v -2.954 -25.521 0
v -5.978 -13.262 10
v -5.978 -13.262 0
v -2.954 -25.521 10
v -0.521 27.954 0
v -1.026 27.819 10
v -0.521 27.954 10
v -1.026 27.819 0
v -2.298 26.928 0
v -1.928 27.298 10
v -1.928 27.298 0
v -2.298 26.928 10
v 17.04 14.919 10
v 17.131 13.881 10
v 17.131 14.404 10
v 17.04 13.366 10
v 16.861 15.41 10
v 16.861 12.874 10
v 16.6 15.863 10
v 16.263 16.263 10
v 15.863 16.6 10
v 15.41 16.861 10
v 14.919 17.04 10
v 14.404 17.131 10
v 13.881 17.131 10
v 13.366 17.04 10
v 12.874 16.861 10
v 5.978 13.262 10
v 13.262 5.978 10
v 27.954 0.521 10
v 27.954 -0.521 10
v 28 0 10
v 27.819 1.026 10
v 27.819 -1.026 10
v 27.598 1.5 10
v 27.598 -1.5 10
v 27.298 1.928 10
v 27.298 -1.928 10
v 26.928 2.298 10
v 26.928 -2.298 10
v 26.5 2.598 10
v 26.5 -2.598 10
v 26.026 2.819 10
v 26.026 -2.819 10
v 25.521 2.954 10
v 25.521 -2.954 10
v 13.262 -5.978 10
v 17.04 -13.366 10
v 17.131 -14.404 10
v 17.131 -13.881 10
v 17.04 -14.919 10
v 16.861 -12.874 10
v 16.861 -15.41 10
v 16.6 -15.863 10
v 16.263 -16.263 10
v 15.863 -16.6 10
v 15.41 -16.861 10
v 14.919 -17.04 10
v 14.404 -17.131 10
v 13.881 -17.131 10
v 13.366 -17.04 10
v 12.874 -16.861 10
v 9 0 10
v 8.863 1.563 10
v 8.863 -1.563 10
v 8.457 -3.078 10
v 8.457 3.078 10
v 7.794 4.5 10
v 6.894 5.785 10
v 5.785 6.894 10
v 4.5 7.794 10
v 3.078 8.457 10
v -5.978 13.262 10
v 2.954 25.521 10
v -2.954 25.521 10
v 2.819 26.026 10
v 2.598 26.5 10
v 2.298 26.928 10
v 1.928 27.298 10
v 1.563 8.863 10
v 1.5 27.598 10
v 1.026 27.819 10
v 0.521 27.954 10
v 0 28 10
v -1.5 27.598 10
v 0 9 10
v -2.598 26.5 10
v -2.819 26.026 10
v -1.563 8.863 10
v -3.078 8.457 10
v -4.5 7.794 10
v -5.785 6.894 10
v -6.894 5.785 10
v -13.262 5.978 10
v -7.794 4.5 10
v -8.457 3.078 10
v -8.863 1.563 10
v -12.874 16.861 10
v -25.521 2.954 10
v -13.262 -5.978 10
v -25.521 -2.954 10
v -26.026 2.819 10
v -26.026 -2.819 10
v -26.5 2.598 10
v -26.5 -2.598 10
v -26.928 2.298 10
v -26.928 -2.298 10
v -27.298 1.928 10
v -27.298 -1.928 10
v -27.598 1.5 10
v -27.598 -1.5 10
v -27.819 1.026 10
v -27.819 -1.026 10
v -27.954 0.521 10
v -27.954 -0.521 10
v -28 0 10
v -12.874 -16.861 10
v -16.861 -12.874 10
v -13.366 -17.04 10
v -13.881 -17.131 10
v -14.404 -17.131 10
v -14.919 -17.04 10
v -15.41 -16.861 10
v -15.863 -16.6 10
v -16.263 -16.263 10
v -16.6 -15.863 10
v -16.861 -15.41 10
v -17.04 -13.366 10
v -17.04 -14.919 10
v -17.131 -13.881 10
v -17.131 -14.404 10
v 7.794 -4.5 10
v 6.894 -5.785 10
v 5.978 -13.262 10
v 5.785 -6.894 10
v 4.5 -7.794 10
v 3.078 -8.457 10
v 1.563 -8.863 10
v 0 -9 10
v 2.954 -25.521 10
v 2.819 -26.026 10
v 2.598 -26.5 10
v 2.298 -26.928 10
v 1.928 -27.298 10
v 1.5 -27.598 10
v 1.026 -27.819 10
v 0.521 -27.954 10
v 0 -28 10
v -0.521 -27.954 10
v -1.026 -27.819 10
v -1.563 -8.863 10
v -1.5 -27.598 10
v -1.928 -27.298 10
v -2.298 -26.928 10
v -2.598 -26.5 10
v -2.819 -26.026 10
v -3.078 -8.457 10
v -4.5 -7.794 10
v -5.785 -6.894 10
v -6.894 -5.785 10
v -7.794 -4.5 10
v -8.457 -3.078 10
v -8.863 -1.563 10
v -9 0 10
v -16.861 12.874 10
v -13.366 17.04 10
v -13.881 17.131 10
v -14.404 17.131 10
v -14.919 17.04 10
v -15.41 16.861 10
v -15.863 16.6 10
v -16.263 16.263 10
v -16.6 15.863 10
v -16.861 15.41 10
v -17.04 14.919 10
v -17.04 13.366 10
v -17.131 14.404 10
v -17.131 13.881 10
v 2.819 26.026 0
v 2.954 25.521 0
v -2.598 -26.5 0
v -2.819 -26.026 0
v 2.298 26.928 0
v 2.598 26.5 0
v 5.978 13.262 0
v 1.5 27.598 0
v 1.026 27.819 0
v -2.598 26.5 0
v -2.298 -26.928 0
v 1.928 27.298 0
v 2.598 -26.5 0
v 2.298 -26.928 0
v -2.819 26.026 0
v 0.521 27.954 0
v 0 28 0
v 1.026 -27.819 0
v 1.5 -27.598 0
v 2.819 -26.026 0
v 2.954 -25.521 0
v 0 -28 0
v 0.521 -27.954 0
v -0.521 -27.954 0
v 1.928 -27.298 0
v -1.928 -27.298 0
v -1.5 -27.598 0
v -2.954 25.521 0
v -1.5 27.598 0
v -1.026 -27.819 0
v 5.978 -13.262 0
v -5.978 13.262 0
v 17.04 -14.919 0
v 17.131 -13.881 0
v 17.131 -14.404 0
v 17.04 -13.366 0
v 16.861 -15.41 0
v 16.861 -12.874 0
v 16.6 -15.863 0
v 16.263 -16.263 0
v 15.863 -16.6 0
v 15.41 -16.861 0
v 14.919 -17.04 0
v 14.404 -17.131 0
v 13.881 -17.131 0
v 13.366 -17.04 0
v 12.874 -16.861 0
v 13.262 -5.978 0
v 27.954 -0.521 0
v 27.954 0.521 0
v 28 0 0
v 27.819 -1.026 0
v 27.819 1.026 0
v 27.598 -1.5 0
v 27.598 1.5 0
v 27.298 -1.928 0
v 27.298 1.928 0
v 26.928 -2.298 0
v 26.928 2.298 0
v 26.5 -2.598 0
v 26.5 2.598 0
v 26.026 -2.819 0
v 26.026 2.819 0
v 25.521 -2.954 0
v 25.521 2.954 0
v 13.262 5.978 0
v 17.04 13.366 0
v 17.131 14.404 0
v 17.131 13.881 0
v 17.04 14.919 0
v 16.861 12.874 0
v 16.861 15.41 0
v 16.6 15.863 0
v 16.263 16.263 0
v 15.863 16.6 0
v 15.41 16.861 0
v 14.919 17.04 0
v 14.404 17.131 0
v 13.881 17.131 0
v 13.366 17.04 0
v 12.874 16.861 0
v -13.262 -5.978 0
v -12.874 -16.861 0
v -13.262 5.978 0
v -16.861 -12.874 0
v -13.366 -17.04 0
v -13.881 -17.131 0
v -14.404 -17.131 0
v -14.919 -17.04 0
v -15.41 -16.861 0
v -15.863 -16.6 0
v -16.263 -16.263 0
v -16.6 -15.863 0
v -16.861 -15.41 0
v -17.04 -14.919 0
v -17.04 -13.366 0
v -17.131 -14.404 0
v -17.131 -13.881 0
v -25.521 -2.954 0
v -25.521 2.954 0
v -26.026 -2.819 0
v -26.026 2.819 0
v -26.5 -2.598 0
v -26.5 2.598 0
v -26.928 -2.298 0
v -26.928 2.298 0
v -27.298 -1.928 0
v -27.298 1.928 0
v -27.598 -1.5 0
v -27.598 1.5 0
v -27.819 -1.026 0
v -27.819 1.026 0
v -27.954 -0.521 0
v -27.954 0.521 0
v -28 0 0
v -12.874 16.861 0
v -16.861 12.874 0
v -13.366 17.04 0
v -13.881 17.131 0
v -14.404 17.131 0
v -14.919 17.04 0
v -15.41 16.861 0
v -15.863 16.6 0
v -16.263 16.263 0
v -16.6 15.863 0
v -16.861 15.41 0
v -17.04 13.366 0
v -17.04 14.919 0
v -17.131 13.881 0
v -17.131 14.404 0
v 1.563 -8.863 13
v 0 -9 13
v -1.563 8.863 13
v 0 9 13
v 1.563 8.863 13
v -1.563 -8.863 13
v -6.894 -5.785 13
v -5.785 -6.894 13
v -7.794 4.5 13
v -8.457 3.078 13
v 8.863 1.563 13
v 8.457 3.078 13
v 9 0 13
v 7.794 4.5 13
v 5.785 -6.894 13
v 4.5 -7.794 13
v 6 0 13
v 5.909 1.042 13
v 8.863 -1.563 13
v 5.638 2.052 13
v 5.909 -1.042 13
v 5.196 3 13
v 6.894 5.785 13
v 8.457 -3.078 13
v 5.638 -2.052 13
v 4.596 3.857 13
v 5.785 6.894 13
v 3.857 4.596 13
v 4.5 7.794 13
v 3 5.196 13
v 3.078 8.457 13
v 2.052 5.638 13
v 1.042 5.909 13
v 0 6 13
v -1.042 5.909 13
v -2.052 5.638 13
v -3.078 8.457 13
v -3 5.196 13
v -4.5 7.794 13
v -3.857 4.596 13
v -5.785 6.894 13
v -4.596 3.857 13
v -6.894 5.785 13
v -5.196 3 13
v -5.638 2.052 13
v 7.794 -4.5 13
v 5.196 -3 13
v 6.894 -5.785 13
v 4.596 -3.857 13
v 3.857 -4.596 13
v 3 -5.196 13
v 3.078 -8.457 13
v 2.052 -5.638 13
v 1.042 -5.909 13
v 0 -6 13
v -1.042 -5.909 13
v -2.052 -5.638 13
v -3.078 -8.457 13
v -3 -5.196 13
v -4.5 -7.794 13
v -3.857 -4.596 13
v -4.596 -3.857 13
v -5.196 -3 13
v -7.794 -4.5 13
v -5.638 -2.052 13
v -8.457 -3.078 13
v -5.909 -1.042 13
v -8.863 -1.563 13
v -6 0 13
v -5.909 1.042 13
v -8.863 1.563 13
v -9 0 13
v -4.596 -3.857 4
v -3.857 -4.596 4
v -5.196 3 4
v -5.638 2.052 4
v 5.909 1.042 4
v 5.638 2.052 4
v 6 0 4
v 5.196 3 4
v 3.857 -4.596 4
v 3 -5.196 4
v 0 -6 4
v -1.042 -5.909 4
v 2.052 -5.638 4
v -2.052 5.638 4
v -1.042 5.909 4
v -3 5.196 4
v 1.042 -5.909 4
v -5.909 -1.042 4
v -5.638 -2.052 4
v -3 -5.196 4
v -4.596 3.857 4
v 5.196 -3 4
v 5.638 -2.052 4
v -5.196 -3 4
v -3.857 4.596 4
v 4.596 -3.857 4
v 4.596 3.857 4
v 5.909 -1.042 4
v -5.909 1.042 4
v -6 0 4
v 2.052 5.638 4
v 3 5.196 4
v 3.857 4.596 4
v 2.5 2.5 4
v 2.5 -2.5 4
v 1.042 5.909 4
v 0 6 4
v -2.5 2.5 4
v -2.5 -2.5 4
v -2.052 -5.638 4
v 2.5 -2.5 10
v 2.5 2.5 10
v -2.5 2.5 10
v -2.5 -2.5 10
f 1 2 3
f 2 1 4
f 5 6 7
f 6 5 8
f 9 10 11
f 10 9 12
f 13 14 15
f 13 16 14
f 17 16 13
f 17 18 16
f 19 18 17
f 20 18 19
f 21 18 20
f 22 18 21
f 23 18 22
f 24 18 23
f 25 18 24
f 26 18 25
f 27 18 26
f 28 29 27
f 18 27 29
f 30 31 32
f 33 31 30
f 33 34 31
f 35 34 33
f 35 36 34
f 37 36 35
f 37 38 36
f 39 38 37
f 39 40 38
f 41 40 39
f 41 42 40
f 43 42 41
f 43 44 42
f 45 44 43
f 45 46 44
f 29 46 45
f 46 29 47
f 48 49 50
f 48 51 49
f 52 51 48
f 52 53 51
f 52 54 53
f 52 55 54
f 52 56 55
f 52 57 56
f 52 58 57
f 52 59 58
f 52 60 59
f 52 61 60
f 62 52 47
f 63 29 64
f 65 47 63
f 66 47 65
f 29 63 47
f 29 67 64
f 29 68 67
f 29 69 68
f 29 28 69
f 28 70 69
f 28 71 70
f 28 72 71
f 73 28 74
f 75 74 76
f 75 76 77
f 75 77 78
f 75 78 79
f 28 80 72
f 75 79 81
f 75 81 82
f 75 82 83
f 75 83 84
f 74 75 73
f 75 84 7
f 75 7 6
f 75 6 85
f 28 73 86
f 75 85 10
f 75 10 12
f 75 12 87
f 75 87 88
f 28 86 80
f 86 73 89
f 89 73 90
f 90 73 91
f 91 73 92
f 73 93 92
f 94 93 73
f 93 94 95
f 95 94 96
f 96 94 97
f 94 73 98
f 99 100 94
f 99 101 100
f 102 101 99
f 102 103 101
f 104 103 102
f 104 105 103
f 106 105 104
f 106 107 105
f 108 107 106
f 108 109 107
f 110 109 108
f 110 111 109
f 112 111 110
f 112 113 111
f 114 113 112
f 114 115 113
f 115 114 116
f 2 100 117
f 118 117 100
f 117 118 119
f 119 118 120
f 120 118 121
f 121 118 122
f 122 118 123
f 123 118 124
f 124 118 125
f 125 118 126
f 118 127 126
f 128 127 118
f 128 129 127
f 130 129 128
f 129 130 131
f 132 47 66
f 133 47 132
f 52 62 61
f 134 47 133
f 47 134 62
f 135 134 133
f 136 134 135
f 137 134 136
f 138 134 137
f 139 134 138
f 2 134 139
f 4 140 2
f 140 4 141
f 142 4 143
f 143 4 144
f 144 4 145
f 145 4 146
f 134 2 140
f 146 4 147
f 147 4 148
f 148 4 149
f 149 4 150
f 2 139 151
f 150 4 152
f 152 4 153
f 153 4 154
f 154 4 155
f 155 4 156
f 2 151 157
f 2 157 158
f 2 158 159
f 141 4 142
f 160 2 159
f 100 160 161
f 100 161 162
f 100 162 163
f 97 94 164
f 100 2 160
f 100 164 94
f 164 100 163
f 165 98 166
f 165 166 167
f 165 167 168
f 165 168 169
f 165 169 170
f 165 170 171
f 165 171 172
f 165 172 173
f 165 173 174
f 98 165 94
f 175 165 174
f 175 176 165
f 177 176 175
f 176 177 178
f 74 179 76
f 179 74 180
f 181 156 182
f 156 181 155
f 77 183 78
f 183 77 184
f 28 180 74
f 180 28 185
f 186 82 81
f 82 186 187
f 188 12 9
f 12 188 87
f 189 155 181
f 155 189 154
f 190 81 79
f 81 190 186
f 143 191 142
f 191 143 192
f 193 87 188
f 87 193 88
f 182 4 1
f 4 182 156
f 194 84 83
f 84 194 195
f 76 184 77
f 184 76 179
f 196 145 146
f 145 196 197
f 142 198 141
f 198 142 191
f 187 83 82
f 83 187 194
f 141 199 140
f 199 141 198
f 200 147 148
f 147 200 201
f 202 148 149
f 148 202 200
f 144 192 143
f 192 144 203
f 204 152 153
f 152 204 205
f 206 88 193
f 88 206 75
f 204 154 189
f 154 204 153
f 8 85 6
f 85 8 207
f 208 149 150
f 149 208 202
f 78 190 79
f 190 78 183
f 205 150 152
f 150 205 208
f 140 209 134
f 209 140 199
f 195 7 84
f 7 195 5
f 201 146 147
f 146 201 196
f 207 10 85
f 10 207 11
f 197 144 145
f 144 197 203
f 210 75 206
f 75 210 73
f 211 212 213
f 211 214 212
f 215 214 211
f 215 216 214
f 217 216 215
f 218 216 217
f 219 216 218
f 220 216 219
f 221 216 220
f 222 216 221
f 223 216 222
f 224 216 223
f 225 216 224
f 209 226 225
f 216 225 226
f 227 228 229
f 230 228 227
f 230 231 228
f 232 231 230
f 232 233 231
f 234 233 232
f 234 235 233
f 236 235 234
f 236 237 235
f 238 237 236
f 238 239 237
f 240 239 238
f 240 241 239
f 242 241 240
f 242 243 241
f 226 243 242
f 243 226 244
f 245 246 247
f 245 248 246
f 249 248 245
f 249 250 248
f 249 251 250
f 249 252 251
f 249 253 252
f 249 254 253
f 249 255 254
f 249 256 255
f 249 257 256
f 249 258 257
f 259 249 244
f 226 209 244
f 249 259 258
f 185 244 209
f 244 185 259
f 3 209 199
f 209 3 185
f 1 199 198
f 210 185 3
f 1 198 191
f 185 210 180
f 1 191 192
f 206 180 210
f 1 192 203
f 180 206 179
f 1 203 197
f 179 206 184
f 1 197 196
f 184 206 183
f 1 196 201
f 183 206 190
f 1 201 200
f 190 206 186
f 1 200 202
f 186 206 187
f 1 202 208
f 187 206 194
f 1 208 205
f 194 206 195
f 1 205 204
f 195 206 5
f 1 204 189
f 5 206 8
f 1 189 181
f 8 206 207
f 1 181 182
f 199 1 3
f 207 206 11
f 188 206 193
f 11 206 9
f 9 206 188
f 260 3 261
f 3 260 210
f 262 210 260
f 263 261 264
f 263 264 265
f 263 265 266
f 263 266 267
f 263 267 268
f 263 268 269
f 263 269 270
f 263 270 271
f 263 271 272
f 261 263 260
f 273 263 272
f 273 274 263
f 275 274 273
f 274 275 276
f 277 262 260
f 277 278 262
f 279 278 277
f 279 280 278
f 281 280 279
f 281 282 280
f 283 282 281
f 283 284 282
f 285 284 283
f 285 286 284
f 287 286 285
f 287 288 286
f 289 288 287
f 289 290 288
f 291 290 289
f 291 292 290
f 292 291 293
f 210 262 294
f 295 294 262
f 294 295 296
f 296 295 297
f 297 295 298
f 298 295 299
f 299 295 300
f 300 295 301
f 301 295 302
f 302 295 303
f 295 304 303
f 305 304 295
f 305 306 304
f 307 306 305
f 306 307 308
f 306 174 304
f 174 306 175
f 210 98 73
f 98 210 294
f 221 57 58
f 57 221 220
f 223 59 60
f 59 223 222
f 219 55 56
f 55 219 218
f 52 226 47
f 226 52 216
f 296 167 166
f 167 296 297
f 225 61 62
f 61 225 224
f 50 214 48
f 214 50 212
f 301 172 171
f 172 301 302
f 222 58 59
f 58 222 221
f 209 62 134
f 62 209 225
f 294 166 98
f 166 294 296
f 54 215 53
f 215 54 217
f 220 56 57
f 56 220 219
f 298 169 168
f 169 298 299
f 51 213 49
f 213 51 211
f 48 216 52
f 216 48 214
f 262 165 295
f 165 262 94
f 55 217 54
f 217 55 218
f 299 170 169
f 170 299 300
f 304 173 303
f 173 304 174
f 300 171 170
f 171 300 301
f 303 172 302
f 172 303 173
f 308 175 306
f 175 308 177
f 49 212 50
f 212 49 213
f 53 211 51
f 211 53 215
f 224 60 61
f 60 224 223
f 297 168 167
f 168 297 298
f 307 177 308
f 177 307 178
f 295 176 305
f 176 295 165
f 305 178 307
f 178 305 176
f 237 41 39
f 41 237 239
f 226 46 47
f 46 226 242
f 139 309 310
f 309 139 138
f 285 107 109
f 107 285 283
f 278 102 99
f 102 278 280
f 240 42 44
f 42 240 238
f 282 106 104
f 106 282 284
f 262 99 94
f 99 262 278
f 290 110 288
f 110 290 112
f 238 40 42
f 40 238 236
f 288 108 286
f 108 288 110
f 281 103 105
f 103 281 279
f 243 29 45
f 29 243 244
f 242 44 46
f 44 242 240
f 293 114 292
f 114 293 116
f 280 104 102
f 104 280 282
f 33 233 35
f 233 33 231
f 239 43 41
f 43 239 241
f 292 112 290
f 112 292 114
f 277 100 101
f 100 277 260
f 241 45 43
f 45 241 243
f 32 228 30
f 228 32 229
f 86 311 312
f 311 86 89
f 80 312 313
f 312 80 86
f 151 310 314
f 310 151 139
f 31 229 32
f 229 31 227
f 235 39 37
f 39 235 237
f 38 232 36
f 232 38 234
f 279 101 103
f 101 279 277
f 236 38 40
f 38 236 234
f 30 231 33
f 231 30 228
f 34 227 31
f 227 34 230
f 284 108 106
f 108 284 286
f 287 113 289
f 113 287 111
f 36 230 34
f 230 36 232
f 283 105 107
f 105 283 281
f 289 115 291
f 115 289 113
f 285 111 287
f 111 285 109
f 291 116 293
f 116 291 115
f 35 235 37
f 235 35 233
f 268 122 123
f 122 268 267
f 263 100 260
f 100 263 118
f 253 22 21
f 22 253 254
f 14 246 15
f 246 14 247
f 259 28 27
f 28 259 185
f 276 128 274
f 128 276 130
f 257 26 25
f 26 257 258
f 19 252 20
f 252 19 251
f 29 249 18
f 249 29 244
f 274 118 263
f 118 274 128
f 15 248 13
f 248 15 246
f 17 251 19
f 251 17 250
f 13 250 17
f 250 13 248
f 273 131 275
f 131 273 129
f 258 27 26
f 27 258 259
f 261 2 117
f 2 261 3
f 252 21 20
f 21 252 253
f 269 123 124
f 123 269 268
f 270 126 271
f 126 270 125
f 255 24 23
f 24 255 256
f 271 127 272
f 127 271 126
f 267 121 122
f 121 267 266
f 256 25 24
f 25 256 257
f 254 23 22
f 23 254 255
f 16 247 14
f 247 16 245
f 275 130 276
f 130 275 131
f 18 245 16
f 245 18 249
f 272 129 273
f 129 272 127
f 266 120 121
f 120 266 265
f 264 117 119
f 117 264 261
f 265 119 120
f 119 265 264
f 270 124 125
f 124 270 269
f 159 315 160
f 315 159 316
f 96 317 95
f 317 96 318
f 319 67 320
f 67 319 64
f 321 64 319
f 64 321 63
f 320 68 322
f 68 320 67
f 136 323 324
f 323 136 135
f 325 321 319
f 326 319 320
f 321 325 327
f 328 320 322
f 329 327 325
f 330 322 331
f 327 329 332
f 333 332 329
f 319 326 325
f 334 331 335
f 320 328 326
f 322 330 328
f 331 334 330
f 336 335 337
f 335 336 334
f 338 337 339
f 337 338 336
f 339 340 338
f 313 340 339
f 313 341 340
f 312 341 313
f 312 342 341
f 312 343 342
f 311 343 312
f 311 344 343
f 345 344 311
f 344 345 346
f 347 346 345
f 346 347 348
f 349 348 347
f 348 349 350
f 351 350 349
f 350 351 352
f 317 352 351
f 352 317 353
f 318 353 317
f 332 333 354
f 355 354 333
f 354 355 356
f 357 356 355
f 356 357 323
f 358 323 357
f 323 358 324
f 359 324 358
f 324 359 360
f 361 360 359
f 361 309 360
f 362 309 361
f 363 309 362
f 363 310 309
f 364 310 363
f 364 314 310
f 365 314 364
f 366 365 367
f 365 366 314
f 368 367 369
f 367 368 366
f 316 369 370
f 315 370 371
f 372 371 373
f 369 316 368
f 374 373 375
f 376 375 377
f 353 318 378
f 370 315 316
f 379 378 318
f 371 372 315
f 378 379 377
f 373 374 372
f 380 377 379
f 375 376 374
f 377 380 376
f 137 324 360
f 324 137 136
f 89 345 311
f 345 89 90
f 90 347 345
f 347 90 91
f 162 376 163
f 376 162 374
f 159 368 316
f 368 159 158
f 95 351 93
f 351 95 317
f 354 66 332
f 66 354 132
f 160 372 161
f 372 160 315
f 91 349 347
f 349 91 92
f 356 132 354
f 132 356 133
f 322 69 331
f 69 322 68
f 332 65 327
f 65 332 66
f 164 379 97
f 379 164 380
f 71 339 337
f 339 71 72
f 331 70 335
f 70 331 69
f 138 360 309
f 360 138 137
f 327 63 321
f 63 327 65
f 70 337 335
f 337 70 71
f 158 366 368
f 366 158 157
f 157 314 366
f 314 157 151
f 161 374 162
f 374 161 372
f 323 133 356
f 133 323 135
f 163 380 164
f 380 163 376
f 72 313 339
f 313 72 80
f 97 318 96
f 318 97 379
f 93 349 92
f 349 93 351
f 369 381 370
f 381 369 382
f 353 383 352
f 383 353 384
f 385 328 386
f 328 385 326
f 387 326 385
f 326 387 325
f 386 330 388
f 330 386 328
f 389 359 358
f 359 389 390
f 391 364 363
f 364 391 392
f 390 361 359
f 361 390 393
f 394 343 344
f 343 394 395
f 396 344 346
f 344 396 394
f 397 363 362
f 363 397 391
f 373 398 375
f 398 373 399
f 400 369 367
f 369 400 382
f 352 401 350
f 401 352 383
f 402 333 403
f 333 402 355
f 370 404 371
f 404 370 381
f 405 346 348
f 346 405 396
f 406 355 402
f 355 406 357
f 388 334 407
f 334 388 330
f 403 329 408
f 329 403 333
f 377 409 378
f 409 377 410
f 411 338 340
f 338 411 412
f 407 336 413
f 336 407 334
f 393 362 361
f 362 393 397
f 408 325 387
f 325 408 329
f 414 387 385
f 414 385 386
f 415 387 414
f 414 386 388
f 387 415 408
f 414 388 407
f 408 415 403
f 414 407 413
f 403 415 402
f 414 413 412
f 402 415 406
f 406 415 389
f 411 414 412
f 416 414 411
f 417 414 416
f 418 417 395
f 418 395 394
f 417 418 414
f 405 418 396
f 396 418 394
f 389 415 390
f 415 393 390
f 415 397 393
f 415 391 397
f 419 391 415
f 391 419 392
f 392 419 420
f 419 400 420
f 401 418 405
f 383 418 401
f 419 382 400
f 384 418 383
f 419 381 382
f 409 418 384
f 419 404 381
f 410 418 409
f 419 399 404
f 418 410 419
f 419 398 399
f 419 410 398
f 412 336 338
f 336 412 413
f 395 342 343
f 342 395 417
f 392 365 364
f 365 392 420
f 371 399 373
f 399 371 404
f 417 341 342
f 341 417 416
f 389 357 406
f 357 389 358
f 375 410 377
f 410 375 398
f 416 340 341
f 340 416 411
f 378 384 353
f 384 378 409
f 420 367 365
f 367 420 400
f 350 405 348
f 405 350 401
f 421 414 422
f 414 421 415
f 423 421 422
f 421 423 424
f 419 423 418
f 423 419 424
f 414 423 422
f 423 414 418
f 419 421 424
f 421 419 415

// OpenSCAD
$fn=36;

Tool_thickness=10;
Tool_radius_1=25;
Tool_radius_2=20;
Tool_points_radius=3;
Socket_radius=6;
Square_size=5;
Square_height=10;


difference()
{
union()
{
hull()
    {
    cylinder(r=Socket_radius+3,h=Tool_thickness);
    
    translate([0,Tool_radius_1,0])
    cylinder(r=Tool_points_radius,h=Tool_thickness);

    translate([0,-Tool_radius_1,0])
    cylinder(r=Tool_points_radius,h=Tool_thickness);
    }

rotate([0,0,45])
hull()
    {
    cylinder(r=Socket_radius+3,h=Tool_thickness);
    
    translate([0,Tool_radius_2,0])
    cylinder(r=Tool_points_radius,h=Tool_thickness);

    translate([0,-Tool_radius_2,0])
    cylinder(r=Tool_points_radius,h=Tool_thickness);
    }

rotate([0,0,90])
hull()
    {
    cylinder(r=Socket_radius+3,h=Tool_thickness);
    
    translate([0,Tool_radius_1,0])
    cylinder(r=Tool_points_radius,h=Tool_thickness);

    translate([0,-Tool_radius_1,0])
    cylinder(r=Tool_points_radius,h=Tool_thickness);
    }

rotate([0,0,135])
hull()
    {
    cylinder(r=Socket_radius+3,h=Tool_thickness);
    
    translate([0,Tool_radius_2,0])
    cylinder(r=Tool_points_radius,h=Tool_thickness);

    translate([0,-Tool_radius_2,0])
    cylinder(r=Tool_points_radius,h=Tool_thickness);
    }


    cylinder(r=Socket_radius+3,h=Tool_thickness+3);
}

    translate([0,0,4])
    cylinder(r=Socket_radius,h=Tool_thickness);

}
translate([0,0,Tool_thickness/2])
cube([Square_size,Square_size,Square_height],center=true);
